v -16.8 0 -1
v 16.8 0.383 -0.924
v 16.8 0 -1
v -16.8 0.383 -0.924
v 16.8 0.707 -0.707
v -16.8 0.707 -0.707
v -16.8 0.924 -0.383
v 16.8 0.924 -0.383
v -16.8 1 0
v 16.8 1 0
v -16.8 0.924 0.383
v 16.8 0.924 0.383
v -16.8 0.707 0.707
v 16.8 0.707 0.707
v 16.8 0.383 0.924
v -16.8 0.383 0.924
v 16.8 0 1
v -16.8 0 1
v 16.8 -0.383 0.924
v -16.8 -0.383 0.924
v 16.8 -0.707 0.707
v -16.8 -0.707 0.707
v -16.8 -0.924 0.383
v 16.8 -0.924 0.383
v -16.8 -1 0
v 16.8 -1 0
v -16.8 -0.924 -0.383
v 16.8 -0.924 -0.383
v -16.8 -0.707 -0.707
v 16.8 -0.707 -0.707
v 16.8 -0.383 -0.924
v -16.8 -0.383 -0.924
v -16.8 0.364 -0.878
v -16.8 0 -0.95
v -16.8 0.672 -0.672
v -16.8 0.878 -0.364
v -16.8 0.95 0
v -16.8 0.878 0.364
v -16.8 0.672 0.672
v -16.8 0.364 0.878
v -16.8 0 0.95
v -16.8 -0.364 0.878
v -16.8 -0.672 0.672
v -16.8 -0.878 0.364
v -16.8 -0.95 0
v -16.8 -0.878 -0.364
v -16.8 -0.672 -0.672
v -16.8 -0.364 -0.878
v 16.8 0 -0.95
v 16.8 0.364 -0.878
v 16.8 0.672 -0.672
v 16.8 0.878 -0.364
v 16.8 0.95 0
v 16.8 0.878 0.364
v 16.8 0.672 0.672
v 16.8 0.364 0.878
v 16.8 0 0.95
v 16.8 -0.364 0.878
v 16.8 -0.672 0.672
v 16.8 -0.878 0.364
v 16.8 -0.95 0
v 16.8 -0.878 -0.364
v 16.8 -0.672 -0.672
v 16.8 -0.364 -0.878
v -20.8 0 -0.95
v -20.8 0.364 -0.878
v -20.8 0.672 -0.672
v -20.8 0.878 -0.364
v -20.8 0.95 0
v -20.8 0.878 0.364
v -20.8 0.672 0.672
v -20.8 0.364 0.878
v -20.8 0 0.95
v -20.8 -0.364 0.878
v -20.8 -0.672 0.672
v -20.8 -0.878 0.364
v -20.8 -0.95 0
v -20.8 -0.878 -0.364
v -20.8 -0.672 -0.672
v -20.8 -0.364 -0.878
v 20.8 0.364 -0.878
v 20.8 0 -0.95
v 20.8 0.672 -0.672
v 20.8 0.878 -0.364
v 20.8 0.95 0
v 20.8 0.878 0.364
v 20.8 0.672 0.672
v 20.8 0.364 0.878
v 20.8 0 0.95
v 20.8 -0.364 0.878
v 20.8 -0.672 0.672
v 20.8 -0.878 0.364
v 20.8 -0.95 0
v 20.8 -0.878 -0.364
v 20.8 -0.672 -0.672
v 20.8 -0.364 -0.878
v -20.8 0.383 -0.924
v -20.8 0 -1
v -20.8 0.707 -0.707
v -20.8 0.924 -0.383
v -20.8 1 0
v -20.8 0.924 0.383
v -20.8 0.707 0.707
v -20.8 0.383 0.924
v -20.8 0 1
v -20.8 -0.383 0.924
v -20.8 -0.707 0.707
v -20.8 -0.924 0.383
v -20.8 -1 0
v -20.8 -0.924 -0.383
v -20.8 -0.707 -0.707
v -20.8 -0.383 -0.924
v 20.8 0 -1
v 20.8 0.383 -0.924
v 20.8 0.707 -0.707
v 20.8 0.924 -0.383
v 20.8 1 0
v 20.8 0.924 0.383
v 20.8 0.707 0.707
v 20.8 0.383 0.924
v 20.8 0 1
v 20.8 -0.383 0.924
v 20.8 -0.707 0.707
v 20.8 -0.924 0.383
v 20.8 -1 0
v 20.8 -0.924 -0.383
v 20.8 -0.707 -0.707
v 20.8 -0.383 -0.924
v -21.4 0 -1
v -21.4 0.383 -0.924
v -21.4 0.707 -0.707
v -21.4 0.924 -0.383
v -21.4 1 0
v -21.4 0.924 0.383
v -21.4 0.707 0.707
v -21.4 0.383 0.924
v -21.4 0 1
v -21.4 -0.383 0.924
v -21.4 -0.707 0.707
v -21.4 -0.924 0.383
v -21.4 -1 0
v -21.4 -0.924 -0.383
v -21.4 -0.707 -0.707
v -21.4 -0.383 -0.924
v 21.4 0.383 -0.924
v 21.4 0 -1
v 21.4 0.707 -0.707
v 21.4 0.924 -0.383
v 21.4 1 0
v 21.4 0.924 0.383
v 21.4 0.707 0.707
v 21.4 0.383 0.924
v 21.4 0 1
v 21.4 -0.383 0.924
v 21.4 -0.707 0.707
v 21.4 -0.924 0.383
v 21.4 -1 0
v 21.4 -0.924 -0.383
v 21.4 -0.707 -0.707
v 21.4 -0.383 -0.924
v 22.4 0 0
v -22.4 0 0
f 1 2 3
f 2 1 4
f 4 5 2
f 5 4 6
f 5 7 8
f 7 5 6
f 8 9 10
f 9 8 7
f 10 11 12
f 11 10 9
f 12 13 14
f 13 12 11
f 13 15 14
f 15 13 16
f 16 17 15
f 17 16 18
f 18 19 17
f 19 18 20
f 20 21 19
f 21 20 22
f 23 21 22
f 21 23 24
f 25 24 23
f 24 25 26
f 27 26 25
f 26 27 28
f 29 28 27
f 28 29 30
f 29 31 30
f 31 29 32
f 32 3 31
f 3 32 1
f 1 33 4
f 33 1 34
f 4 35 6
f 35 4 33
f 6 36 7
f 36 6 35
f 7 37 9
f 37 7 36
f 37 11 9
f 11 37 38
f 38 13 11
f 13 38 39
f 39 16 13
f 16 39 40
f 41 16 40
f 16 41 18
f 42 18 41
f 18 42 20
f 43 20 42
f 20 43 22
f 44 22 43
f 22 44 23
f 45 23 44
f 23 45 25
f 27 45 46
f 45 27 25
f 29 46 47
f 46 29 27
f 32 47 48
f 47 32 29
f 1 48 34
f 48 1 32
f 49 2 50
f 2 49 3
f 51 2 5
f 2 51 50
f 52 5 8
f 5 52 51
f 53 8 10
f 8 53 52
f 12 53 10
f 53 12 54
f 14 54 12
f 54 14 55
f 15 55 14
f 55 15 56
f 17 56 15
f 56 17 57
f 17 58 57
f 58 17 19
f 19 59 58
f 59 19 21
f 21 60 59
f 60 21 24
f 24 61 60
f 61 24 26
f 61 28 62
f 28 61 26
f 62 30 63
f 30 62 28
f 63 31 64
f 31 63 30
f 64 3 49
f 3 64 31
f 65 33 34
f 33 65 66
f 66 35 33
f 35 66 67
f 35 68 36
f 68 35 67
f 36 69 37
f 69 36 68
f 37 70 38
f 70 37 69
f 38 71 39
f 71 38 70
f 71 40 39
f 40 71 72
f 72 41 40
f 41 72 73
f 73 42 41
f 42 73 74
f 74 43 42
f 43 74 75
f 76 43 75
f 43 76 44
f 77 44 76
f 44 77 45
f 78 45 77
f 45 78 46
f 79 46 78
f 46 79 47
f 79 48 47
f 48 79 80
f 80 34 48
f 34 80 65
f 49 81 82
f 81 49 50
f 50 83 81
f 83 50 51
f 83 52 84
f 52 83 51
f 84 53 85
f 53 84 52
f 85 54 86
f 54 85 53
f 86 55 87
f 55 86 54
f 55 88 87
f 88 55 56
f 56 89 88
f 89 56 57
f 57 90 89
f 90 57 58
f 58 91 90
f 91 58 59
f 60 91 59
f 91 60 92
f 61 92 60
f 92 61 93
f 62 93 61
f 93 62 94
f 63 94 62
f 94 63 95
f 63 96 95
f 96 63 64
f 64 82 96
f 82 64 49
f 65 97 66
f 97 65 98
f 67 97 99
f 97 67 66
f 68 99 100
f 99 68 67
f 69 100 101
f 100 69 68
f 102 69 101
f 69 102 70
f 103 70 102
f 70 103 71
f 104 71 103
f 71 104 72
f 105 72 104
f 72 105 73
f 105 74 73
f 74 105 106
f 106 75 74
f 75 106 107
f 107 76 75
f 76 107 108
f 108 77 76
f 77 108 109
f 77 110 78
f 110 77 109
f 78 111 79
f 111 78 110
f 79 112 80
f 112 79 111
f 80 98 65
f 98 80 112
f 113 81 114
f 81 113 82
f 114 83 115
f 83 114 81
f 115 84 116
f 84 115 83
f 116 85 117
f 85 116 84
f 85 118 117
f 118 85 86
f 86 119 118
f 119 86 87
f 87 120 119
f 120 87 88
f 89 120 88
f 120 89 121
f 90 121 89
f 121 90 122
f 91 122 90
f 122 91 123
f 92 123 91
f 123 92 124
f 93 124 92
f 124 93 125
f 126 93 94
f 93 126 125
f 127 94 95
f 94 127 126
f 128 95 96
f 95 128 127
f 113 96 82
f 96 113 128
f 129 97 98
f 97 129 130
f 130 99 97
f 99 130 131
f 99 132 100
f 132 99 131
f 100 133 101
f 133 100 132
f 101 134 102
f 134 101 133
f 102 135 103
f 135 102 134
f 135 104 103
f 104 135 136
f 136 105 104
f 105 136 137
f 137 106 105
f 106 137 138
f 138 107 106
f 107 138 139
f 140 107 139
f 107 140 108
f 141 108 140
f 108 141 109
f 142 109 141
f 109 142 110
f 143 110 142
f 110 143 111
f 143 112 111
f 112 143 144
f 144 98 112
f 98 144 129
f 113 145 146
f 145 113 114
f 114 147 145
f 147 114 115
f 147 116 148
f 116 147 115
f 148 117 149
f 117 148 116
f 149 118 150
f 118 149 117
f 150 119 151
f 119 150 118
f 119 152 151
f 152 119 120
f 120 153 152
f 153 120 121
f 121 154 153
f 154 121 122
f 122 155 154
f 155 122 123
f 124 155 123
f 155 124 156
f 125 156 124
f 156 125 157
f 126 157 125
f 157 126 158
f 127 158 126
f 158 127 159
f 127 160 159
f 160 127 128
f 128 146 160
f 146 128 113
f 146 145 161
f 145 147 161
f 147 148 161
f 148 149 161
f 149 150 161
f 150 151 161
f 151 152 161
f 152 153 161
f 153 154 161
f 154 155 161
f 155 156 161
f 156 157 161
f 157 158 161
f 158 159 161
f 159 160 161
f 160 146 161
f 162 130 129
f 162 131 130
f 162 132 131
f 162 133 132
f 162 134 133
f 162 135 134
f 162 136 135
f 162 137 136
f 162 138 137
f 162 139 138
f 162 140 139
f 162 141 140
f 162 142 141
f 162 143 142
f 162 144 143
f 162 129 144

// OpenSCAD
// file: ../p/4-4edge.scad
use <../lib.scad>
function ldraw_lib__4_4edge() = [
// 0 Circle 1.0
// 0 Name: 4-4edge.dat
// 0 Author: James Jessiman
// 0 !LDRAW_ORG Primitive UPDATE 2017-01
// 0 !LICENSE Licensed under CC BY 2.0 and CC BY 4.0 : see CAreadme.txt
// 
// 0 BFC CERTIFY CCW
  [0,"BFC","CERTIFY"],
  [0,"BFC","CCW"],
// 
// 0 !HISTORY 1998-12-15 [PTadmin] Official Update 1998-10
// 0 !HISTORY 2005-12-28 [PTadmin] Official Update 2005-01
// 0 !HISTORY 2007-06-24 [PTadmin] Header formatted for Contributor Agreement
// 0 !HISTORY 2008-07-01 [PTadmin] Official Update 2008-01
// 0 !HISTORY 2017-01-15 [Steffen] BFCed
// 0 !HISTORY 2017-12-30 [PTadmin] Official Update 2017-01
// 
// 
// 2 24 1 0 0 0.9239 0 0.3827
  [2,24,1,0,0,0.9239,0,0.3827],
// 2 24 0.9239 0 0.3827 0.7071 0 0.7071
  [2,24,0.9239,0,0.3827,0.7071,0,0.7071],
// 2 24 0.7071 0 0.7071 0.3827 0 0.9239
  [2,24,0.7071,0,0.7071,0.3827,0,0.9239],
// 2 24 0.3827 0 0.9239 0 0 1
  [2,24,0.3827,0,0.9239,0,0,1],
// 2 24 0 0 1 -0.3827 0 0.9239
  [2,24,0,0,1,-0.3827,0,0.9239],
// 2 24 -0.3827 0 0.9239 -0.7071 0 0.7071
  [2,24,-0.3827,0,0.9239,-0.7071,0,0.7071],
// 2 24 -0.7071 0 0.7071 -0.9239 0 0.3827
  [2,24,-0.7071,0,0.7071,-0.9239,0,0.3827],
// 2 24 -0.9239 0 0.3827 -1 0 -0
  [2,24,-0.9239,0,0.3827,-1,0,-0],
// 2 24 -1 0 -0 -0.9239 0 -0.3827
  [2,24,-1,0,-0,-0.9239,0,-0.3827],
// 2 24 -0.9239 0 -0.3827 -0.7071 0 -0.7071
  [2,24,-0.9239,0,-0.3827,-0.7071,0,-0.7071],
// 2 24 -0.7071 0 -0.7071 -0.3827 0 -0.9239
  [2,24,-0.7071,0,-0.7071,-0.3827,0,-0.9239],
// 2 24 -0.3827 0 -0.9239 0 0 -1
  [2,24,-0.3827,0,-0.9239,0,0,-1],
// 2 24 0 0 -1 0.3827 0 -0.9239
  [2,24,0,0,-1,0.3827,0,-0.9239],
// 2 24 0.3827 0 -0.9239 0.7071 0 -0.7071
  [2,24,0.3827,0,-0.9239,0.7071,0,-0.7071],
// 2 24 0.7071 0 -0.7071 0.9239 0 -0.3827
  [2,24,0.7071,0,-0.7071,0.9239,0,-0.3827],
// 2 24 0.9239 0 -0.3827 1 0 0
  [2,24,0.9239,0,-0.3827,1,0,0],
];
module ldraw_lib__4_4edge(step=0, col=false, unit=2/5, alt=false, line=0.2, solid=!$preview)
    makepoly(ldraw_lib__4_4edge(), step=step, col=col, unit=unit, alt=alt, line=line, solid=solid);
ldraw_lib__4_4edge(line=0.2);
// file: ../p/4-4cyli.scad
use <../lib.scad>
function ldraw_lib__4_4cyli() = [
// 0 Cylinder 1.0
// 0 Name: 4-4cyli.dat
// 0 Author: James Jessiman
// 0 !LDRAW_ORG Primitive UPDATE 2005-01
// 0 !LICENSE Licensed under CC BY 2.0 and CC BY 4.0 : see CAreadme.txt
// 
// 0 BFC CERTIFY CCW
  [0,"BFC","CERTIFY"],
  [0,"BFC","CCW"],
// 
// 0 !HISTORY 1998-12-15 [PTadmin] Official Update 1998-10
// 0 !HISTORY 2002-03-23 [sbliss] Added BFC statement; merged headers from files in distributions LDraw 0.27 and Complete.
// 0 !HISTORY 2002-04-25 [PTadmin] Official Update 2002-02
// 0 !HISTORY 2004-12-14 [guyvivan] BFC CCW
// 0 !HISTORY 2005-12-28 [PTadmin] Official Update 2005-01
// 0 !HISTORY 2007-06-24 [PTadmin] Header formatted for Contributor Agreement
// 0 !HISTORY 2008-07-01 [PTadmin] Official Update 2008-01
// 
// 
// 4 16 1 1 0 0.9239 1 0.3827 0.9239 0 0.3827 1 0 0
  [4,16,1,1,0,0.9239,1,0.3827,0.9239,0,0.3827,1,0,0],
// 5 24 1 0 0 1 1 0 0.9239 0 0.3827 0.9239 0 -0.3827
  [5,24,1,0,0,1,1,0,0.9239,0,0.3827,0.9239,0,-0.3827],
// 4 16 0.9239 1 0.3827 0.7071 1 0.7071 0.7071 0 0.7071 0.9239 0 0.3827
  [4,16,0.9239,1,0.3827,0.7071,1,0.7071,0.7071,0,0.7071,0.9239,0,0.3827],
// 5 24 0.9239 0 0.3827 0.9239 1 0.3827 0.7071 0 0.7071 1 0 0
  [5,24,0.9239,0,0.3827,0.9239,1,0.3827,0.7071,0,0.7071,1,0,0],
// 4 16 0.7071 1 0.7071 0.3827 1 0.9239 0.3827 0 0.9239 0.7071 0 0.7071
  [4,16,0.7071,1,0.7071,0.3827,1,0.9239,0.3827,0,0.9239,0.7071,0,0.7071],
// 5 24 0.7071 0 0.7071 0.7071 1 0.7071 0.3827 0 0.9239 0.9239 0 0.3827
  [5,24,0.7071,0,0.7071,0.7071,1,0.7071,0.3827,0,0.9239,0.9239,0,0.3827],
// 4 16 0.3827 1 0.9239 0 1 1 0 0 1 0.3827 0 0.9239
  [4,16,0.3827,1,0.9239,0,1,1,0,0,1,0.3827,0,0.9239],
// 5 24 0.3827 0 0.9239 0.3827 1 0.9239 0 0 1 0.7071 0 0.7071
  [5,24,0.3827,0,0.9239,0.3827,1,0.9239,0,0,1,0.7071,0,0.7071],
// 4 16 0 1 1 -0.3827 1 0.9239 -0.3827 0 0.9239 0 0 1
  [4,16,0,1,1,-0.3827,1,0.9239,-0.3827,0,0.9239,0,0,1],
// 5 24 0 0 1 0 1 1 -0.3827 0 0.9239 0.3827 0 0.9239
  [5,24,0,0,1,0,1,1,-0.3827,0,0.9239,0.3827,0,0.9239],
// 4 16 -0.3827 1 0.9239 -0.7071 1 0.7071 -0.7071 0 0.7071 -0.3827 0 0.9239
  [4,16,-0.3827,1,0.9239,-0.7071,1,0.7071,-0.7071,0,0.7071,-0.3827,0,0.9239],
// 5 24 -0.3827 0 0.9239 -0.3827 1 0.9239 -0.7071 0 0.7071 0 0 1
  [5,24,-0.3827,0,0.9239,-0.3827,1,0.9239,-0.7071,0,0.7071,0,0,1],
// 4 16 -0.7071 1 0.7071 -0.9239 1 0.3827 -0.9239 0 0.3827 -0.7071 0 0.7071
  [4,16,-0.7071,1,0.7071,-0.9239,1,0.3827,-0.9239,0,0.3827,-0.7071,0,0.7071],
// 5 24 -0.7071 0 0.7071 -0.7071 1 0.7071 -0.9239 0 0.3827 -0.3827 0 0.9239
  [5,24,-0.7071,0,0.7071,-0.7071,1,0.7071,-0.9239,0,0.3827,-0.3827,0,0.9239],
// 4 16 -0.9239 1 0.3827 -1 1 0 -1 0 0 -0.9239 0 0.3827
  [4,16,-0.9239,1,0.3827,-1,1,0,-1,0,0,-0.9239,0,0.3827],
// 5 24 -0.9239 0 0.3827 -0.9239 1 0.3827 -1 0 0 -0.7071 0 0.7071
  [5,24,-0.9239,0,0.3827,-0.9239,1,0.3827,-1,0,0,-0.7071,0,0.7071],
// 4 16 -1 1 0 -0.9239 1 -0.3827 -0.9239 0 -0.3827 -1 0 0
  [4,16,-1,1,0,-0.9239,1,-0.3827,-0.9239,0,-0.3827,-1,0,0],
// 5 24 -1 0 0 -1 1 0 -0.9239 0 -0.3827 -0.9239 0 0.3827
  [5,24,-1,0,0,-1,1,0,-0.9239,0,-0.3827,-0.9239,0,0.3827],
// 4 16 -0.9239 1 -0.3827 -0.7071 1 -0.7071 -0.7071 0 -0.7071 -0.9239 0 -0.3827
  [4,16,-0.9239,1,-0.3827,-0.7071,1,-0.7071,-0.7071,0,-0.7071,-0.9239,0,-0.3827],
// 5 24 -0.9239 0 -0.3827 -0.9239 1 -0.3827 -0.7071 0 -0.7071 -1 0 0
  [5,24,-0.9239,0,-0.3827,-0.9239,1,-0.3827,-0.7071,0,-0.7071,-1,0,0],
// 4 16 -0.7071 1 -0.7071 -0.3827 1 -0.9239 -0.3827 0 -0.9239 -0.7071 0 -0.7071
  [4,16,-0.7071,1,-0.7071,-0.3827,1,-0.9239,-0.3827,0,-0.9239,-0.7071,0,-0.7071],
// 5 24 -0.7071 0 -0.7071 -0.7071 1 -0.7071 -0.3827 0 -0.9239 -0.9239 0 -0.3827
  [5,24,-0.7071,0,-0.7071,-0.7071,1,-0.7071,-0.3827,0,-0.9239,-0.9239,0,-0.3827],
// 4 16 -0.3827 1 -0.9239 0 1 -1 0 0 -1 -0.3827 0 -0.9239
  [4,16,-0.3827,1,-0.9239,0,1,-1,0,0,-1,-0.3827,0,-0.9239],
// 5 24 -0.3827 0 -0.9239 -0.3827 1 -0.9239 0 0 -1 -0.7071 0 -0.7071
  [5,24,-0.3827,0,-0.9239,-0.3827,1,-0.9239,0,0,-1,-0.7071,0,-0.7071],
// 4 16 0 1 -1 0.3827 1 -0.9239 0.3827 0 -0.9239 0 0 -1
  [4,16,0,1,-1,0.3827,1,-0.9239,0.3827,0,-0.9239,0,0,-1],
// 5 24 0 0 -1 0 1 -1 0.3827 0 -0.9239 -0.3827 0 -0.9239
  [5,24,0,0,-1,0,1,-1,0.3827,0,-0.9239,-0.3827,0,-0.9239],
// 4 16 0.3827 1 -0.9239 0.7071 1 -0.7071 0.7071 0 -0.7071 0.3827 0 -0.9239
  [4,16,0.3827,1,-0.9239,0.7071,1,-0.7071,0.7071,0,-0.7071,0.3827,0,-0.9239],
// 5 24 0.3827 0 -0.9239 0.3827 1 -0.9239 0.7071 0 -0.7071 0 0 -1
  [5,24,0.3827,0,-0.9239,0.3827,1,-0.9239,0.7071,0,-0.7071,0,0,-1],
// 4 16 0.7071 1 -0.7071 0.9239 1 -0.3827 0.9239 0 -0.3827 0.7071 0 -0.7071
  [4,16,0.7071,1,-0.7071,0.9239,1,-0.3827,0.9239,0,-0.3827,0.7071,0,-0.7071],
// 5 24 0.7071 0 -0.7071 0.7071 1 -0.7071 0.9239 0 -0.3827 0.3827 0 -0.9239
  [5,24,0.7071,0,-0.7071,0.7071,1,-0.7071,0.9239,0,-0.3827,0.3827,0,-0.9239],
// 4 16 0.9239 1 -0.3827 1 1 0 1 0 0 0.9239 0 -0.3827
  [4,16,0.9239,1,-0.3827,1,1,0,1,0,0,0.9239,0,-0.3827],
// 5 24 0.9239 0 -0.3827 0.9239 1 -0.3827 1 0 0 0.7071 0 -0.7071
  [5,24,0.9239,0,-0.3827,0.9239,1,-0.3827,1,0,0,0.7071,0,-0.7071],
// 0
];
module ldraw_lib__4_4cyli(step=0, col=false, unit=2/5, alt=false, line=0.2, solid=!$preview)
    makepoly(ldraw_lib__4_4cyli(), step=step, col=col, unit=unit, alt=alt, line=line, solid=solid);
ldraw_lib__4_4cyli(line=0.2);
// file: ../p/4-4rin19.scad
use <../lib.scad>
function ldraw_lib__4_4rin19() = [
// 0 Ring 19 x 1.0
// 0 Name: 4-4rin19.dat
// 0 Author: Guy Vivan [guyvivan]
// 0 !LDRAW_ORG Primitive UPDATE 2010-01
// 0 !LICENSE Licensed under CC BY 2.0 and CC BY 4.0 : see CAreadme.txt
// 
// 0 BFC CERTIFY CCW
  [0,"BFC","CERTIFY"],
  [0,"BFC","CCW"],
// 
// 0 !HISTORY 2010-04-05 [PTadmin] Official Update 2010-01
// 
// 
// 4 16 19 0 0 20 0 0 18.478 0 7.654 17.5541 0 7.2713
  [4,16,19,0,0,20,0,0,18.478,0,7.654,17.5541,0,7.2713],
// 4 16 17.5541 0 7.2713 18.478 0 7.654 14.142 0 14.142 13.4349 0 13.4349
  [4,16,17.5541,0,7.2713,18.478,0,7.654,14.142,0,14.142,13.4349,0,13.4349],
// 4 16 13.4349 0 13.4349 14.142 0 14.142 7.654 0 18.478 7.2713 0 17.5541
  [4,16,13.4349,0,13.4349,14.142,0,14.142,7.654,0,18.478,7.2713,0,17.5541],
// 4 16 7.2713 0 17.5541 7.654 0 18.478 0 0 20 0 0 19
  [4,16,7.2713,0,17.5541,7.654,0,18.478,0,0,20,0,0,19],
// 4 16 0 0 19 0 0 20 -7.654 0 18.478 -7.2713 0 17.5541
  [4,16,0,0,19,0,0,20,-7.654,0,18.478,-7.2713,0,17.5541],
// 4 16 -7.2713 0 17.5541 -7.654 0 18.478 -14.142 0 14.142 -13.4349 0 13.4349
  [4,16,-7.2713,0,17.5541,-7.654,0,18.478,-14.142,0,14.142,-13.4349,0,13.4349],
// 4 16 -13.4349 0 13.4349 -14.142 0 14.142 -18.478 0 7.654 -17.5541 0 7.2713
  [4,16,-13.4349,0,13.4349,-14.142,0,14.142,-18.478,0,7.654,-17.5541,0,7.2713],
// 4 16 -17.5541 0 7.2713 -18.478 0 7.654 -20 0 0 -19 0 0
  [4,16,-17.5541,0,7.2713,-18.478,0,7.654,-20,0,0,-19,0,0],
// 4 16 -19 0 0 -20 0 0 -18.478 0 -7.654 -17.5541 0 -7.2713
  [4,16,-19,0,0,-20,0,0,-18.478,0,-7.654,-17.5541,0,-7.2713],
// 4 16 -17.5541 0 -7.2713 -18.478 0 -7.654 -14.142 0 -14.142 -13.4349 0 -13.4349
  [4,16,-17.5541,0,-7.2713,-18.478,0,-7.654,-14.142,0,-14.142,-13.4349,0,-13.4349],
// 4 16 -13.4349 0 -13.4349 -14.142 0 -14.142 -7.654 0 -18.478 -7.2713 0 -17.5541
  [4,16,-13.4349,0,-13.4349,-14.142,0,-14.142,-7.654,0,-18.478,-7.2713,0,-17.5541],
// 4 16 -7.2713 0 -17.5541 -7.654 0 -18.478 0 0 -20 0 0 -19
  [4,16,-7.2713,0,-17.5541,-7.654,0,-18.478,0,0,-20,0,0,-19],
// 4 16 0 0 -19 0 0 -20 7.654 0 -18.478 7.2713 0 -17.5541
  [4,16,0,0,-19,0,0,-20,7.654,0,-18.478,7.2713,0,-17.5541],
// 4 16 7.2713 0 -17.5541 7.654 0 -18.478 14.142 0 -14.142 13.4349 0 -13.4349
  [4,16,7.2713,0,-17.5541,7.654,0,-18.478,14.142,0,-14.142,13.4349,0,-13.4349],
// 4 16 13.4349 0 -13.4349 14.142 0 -14.142 18.478 0 -7.654 17.5541 0 -7.2713
  [4,16,13.4349,0,-13.4349,14.142,0,-14.142,18.478,0,-7.654,17.5541,0,-7.2713],
// 4 16 17.5541 0 -7.2713 18.478 0 -7.654 20 0 0 19 0 0
  [4,16,17.5541,0,-7.2713,18.478,0,-7.654,20,0,0,19,0,0],
// 
// 0 end of file
// 
];
module ldraw_lib__4_4rin19(step=0, col=false, unit=2/5, alt=false, line=0.2, solid=!$preview)
    makepoly(ldraw_lib__4_4rin19(), step=step, col=col, unit=unit, alt=alt, line=line, solid=solid);
ldraw_lib__4_4rin19(line=0.2);
// file: ../p/4-4cylo.scad
use <../lib.scad>
use <4-4cyli.scad>
use <4-4edge.scad>
function ldraw_lib__4_4cylo() = [
// 0 Cylinder Open 1.0
// 0 Name: 4-4cylo.dat
// 0 Author: Mark Kennedy [mkennedy]
// 0 !LDRAW_ORG Primitive UPDATE 2010-01
// 0 !LICENSE Licensed under CC BY 2.0 and CC BY 4.0 : see CAreadme.txt
// 
// 0 BFC CERTIFY CCW
  [0,"BFC","CERTIFY"],
  [0,"BFC","CCW"],
// 
// 0 !HISTORY 2010-04-05 [PTadmin] Official Update 2010-01
// 
// 
// 1 16 0 0 0 1 0 0 0 1 0 0 0 1 4-4edge.dat
  [1,16,0,0,0,1,0,0,0,1,0,0,0,1, ldraw_lib__4_4edge()],
// 1 16 0 1 0 1 0 0 0 1 0 0 0 1 4-4edge.dat
  [1,16,0,1,0,1,0,0,0,1,0,0,0,1, ldraw_lib__4_4edge()],
// 1 16 0 0 0 1 0 0 0 1 0 0 0 1 4-4cyli.dat
  [1,16,0,0,0,1,0,0,0,1,0,0,0,1, ldraw_lib__4_4cyli()],
// 0
];
module ldraw_lib__4_4cylo(step=0, col=false, unit=2/5, alt=false, line=0.2, solid=!$preview)
    makepoly(ldraw_lib__4_4cylo(), step=step, col=col, unit=unit, alt=alt, line=line, solid=solid);
ldraw_lib__4_4cylo(line=0.2);
// file: ../p/4-4con0.scad
use <../lib.scad>
function ldraw_lib__4_4con0() = [
// 0 Cone  0 x 1.0
// 0 Name: 4-4con0.dat
// 0 Author: William Howard [WilliamH]
// 0 !LDRAW_ORG Primitive UPDATE 2009-03
// 0 !LICENSE Licensed under CC BY 2.0 and CC BY 4.0 : see CAreadme.txt
// 
// 0 BFC CERTIFY CCW
  [0,"BFC","CERTIFY"],
  [0,"BFC","CCW"],
// 
// 0 !HISTORY 2009-12-29 [PTadmin] Official Update 2009-03
// 
// 
// 3 16 0 1 0 0.9239 0 0.3827 1 0 0
  [3,16,0,1,0,0.9239,0,0.3827,1,0,0],
// 3 16 0 1 0 0.7071 0 0.7071 0.9239 0 0.3827
  [3,16,0,1,0,0.7071,0,0.7071,0.9239,0,0.3827],
// 3 16 0 1 0 0.3827 0 0.9239 0.7071 0 0.7071
  [3,16,0,1,0,0.3827,0,0.9239,0.7071,0,0.7071],
// 3 16 0 1 0 0 0 1 0.3827 0 0.9239
  [3,16,0,1,0,0,0,1,0.3827,0,0.9239],
// 3 16 0 1 0 -0.3827 0 0.9239 0 0 1
  [3,16,0,1,0,-0.3827,0,0.9239,0,0,1],
// 3 16 0 1 0 -0.7071 0 0.7071 -0.3827 0 0.9239
  [3,16,0,1,0,-0.7071,0,0.7071,-0.3827,0,0.9239],
// 3 16 0 1 0 -0.9239 0 0.3827 -0.7071 0 0.7071
  [3,16,0,1,0,-0.9239,0,0.3827,-0.7071,0,0.7071],
// 3 16 0 1 0 -1 0 0 -0.9239 0 0.3827
  [3,16,0,1,0,-1,0,0,-0.9239,0,0.3827],
// 3 16 0 1 0 -0.9239 0 -0.3827 -1 0 0
  [3,16,0,1,0,-0.9239,0,-0.3827,-1,0,0],
// 3 16 0 1 0 -0.7071 0 -0.7071 -0.9239 0 -0.3827
  [3,16,0,1,0,-0.7071,0,-0.7071,-0.9239,0,-0.3827],
// 3 16 0 1 0 -0.3827 0 -0.9239 -0.7071 0 -0.7071
  [3,16,0,1,0,-0.3827,0,-0.9239,-0.7071,0,-0.7071],
// 3 16 0 1 0 0 0 -1 -0.3827 0 -0.9239
  [3,16,0,1,0,0,0,-1,-0.3827,0,-0.9239],
// 3 16 0 1 0 0.3827 0 -0.9239 0 0 -1
  [3,16,0,1,0,0.3827,0,-0.9239,0,0,-1],
// 3 16 0 1 0 0.7071 0 -0.7071 0.3827 0 -0.9239
  [3,16,0,1,0,0.7071,0,-0.7071,0.3827,0,-0.9239],
// 3 16 0 1 0 0.9239 0 -0.3827 0.7071 0 -0.7071
  [3,16,0,1,0,0.9239,0,-0.3827,0.7071,0,-0.7071],
// 3 16 0 1 0 1 0 0 0.9239 0 -0.3827
  [3,16,0,1,0,1,0,0,0.9239,0,-0.3827],
// 
// 0 conditional lines
// 5 24 0 1 0 1 0 0 0.9239 0 -0.3827 0.9239 0 0.3827
  [5,24,0,1,0,1,0,0,0.9239,0,-0.3827,0.9239,0,0.3827],
// 5 24 0 1 0 0.9239 0 0.3827 1 0 0 0.7071 0 0.7071
  [5,24,0,1,0,0.9239,0,0.3827,1,0,0,0.7071,0,0.7071],
// 5 24 0 1 0 0.7071 0 0.7071 0.9239 0 0.3827 0.3827 0 0.9239
  [5,24,0,1,0,0.7071,0,0.7071,0.9239,0,0.3827,0.3827,0,0.9239],
// 5 24 0 1 0 0.3827 0 0.9239 0.7071 0 0.7071 0 0 1
  [5,24,0,1,0,0.3827,0,0.9239,0.7071,0,0.7071,0,0,1],
// 5 24 0 1 0 0 0 1 0.3827 0 0.9239 -0.3827 0 0.9239
  [5,24,0,1,0,0,0,1,0.3827,0,0.9239,-0.3827,0,0.9239],
// 5 24 0 1 0 -0.3827 0 0.9239 0 0 1 -0.7071 0 0.7071
  [5,24,0,1,0,-0.3827,0,0.9239,0,0,1,-0.7071,0,0.7071],
// 5 24 0 1 0 -0.7071 0 0.7071 -0.3827 0 0.9239 -0.9239 0 0.3827
  [5,24,0,1,0,-0.7071,0,0.7071,-0.3827,0,0.9239,-0.9239,0,0.3827],
// 5 24 0 1 0 -0.9239 0 0.3827 -0.7071 0 0.7071 -1 0 0
  [5,24,0,1,0,-0.9239,0,0.3827,-0.7071,0,0.7071,-1,0,0],
// 5 24 0 1 0 -1 0 0 -0.9239 0 0.3827 -0.9239 0 -0.3827
  [5,24,0,1,0,-1,0,0,-0.9239,0,0.3827,-0.9239,0,-0.3827],
// 5 24 0 1 0 -0.9239 0 -0.3827 -1 0 0 -0.7071 0 -0.7071
  [5,24,0,1,0,-0.9239,0,-0.3827,-1,0,0,-0.7071,0,-0.7071],
// 5 24 0 1 0 -0.7071 0 -0.7071 -0.9239 0 -0.3827 -0.3827 0 -0.9239
  [5,24,0,1,0,-0.7071,0,-0.7071,-0.9239,0,-0.3827,-0.3827,0,-0.9239],
// 5 24 0 1 0 -0.3827 0 -0.9239 -0.7071 0 -0.7071 0 0 -1
  [5,24,0,1,0,-0.3827,0,-0.9239,-0.7071,0,-0.7071,0,0,-1],
// 5 24 0 1 0 0 0 -1 -0.3827 0 -0.9239 0.3827 0 -0.9239
  [5,24,0,1,0,0,0,-1,-0.3827,0,-0.9239,0.3827,0,-0.9239],
// 5 24 0 1 0 0.3827 0 -0.9239 0 0 -1 0.7071 0 -0.7071
  [5,24,0,1,0,0.3827,0,-0.9239,0,0,-1,0.7071,0,-0.7071],
// 5 24 0 1 0 0.7071 0 -0.7071 0.3827 0 -0.9239 0.9239 0 -0.3827
  [5,24,0,1,0,0.7071,0,-0.7071,0.3827,0,-0.9239,0.9239,0,-0.3827],
// 5 24 0 1 0 0.9239 0 -0.3827 0.7071 0 -0.7071 1 0 0
  [5,24,0,1,0,0.9239,0,-0.3827,0.7071,0,-0.7071,1,0,0],
// 
// 0 end of file
];
module ldraw_lib__4_4con0(step=0, col=false, unit=2/5, alt=false, line=0.2, solid=!$preview)
    makepoly(ldraw_lib__4_4con0(), step=step, col=col, unit=unit, alt=alt, line=line, solid=solid);
ldraw_lib__4_4con0(line=0.2);
// main file
use <../lib.scad>
use <../p/4-4con0.scad>
use <../p/4-4cylo.scad>
use <../p/4-4rin19.scad>
function ldraw_lib__70720() = [
// 0 ~Axle Steel  5 x 112 LDU with Conical Ends
// 0 Name: 70720.dat
// 0 Author: Magnus Forsberg [MagFors]
// 0 !LDRAW_ORG Part UPDATE 2013-02
// 0 !LICENSE Licensed under CC BY 2.0 and CC BY 4.0 : see CAreadme.txt
// 
// 0 BFC CERTIFY CCW
  [0,"BFC","CERTIFY"],
  [0,"BFC","CCW"],
// 
// 0 !CATEGORY Wheel
// 
// 0 !HISTORY 2013-06-28 [MMR1988] Changed to correct dimensions.
// 0 !HISTORY 2013-12-23 [PTadmin] Official Update 2013-02
// 
// 
// 1 16 -42 0 0 0 84 0 2.5 0 0 0 0 2.5 4-4cylo.dat
  [1,16,-42,0,0,0,84,0,2.5,0,0,0,0,2.5, ldraw_lib__4_4cylo()],
// 1 16 -42 0 0 0 1 0 0.125 0 0 0 0 0.125 4-4rin19.dat
  [1,16,-42,0,0,0,1,0,0.125,0,0,0,0,0.125, ldraw_lib__4_4rin19()],
// 1 16 42 0 0 0 -1 0 0.125 0 0 0 0 0.125 4-4rin19.dat
  [1,16,42,0,0,0,-1,0,0.125,0,0,0,0,0.125, ldraw_lib__4_4rin19()],
// 1 16 -42 0 0 0 -10 0 2.375 0 0 0 0 2.375 4-4cylo.dat
  [1,16,-42,0,0,0,-10,0,2.375,0,0,0,0,2.375, ldraw_lib__4_4cylo()],
// 1 16 42 0 0 0 10 0 2.375 0 0 0 0 2.375 4-4cylo.dat
  [1,16,42,0,0,0,10,0,2.375,0,0,0,0,2.375, ldraw_lib__4_4cylo()],
// 
// 1 16 -52 0 0 0 -1 0 0.125 0 0 0 0 0.125 4-4rin19.dat
  [1,16,-52,0,0,0,-1,0,0.125,0,0,0,0,0.125, ldraw_lib__4_4rin19()],
// 1 16 52 0 0 0 1 0 0.125 0 0 0 0 0.125 4-4rin19.dat
  [1,16,52,0,0,0,1,0,0.125,0,0,0,0,0.125, ldraw_lib__4_4rin19()],
// 1 16 -53.5 0 0 0 1.5 0 2.5 0 0 0 0 2.5 4-4cylo.dat
  [1,16,-53.5,0,0,0,1.5,0,2.5,0,0,0,0,2.5, ldraw_lib__4_4cylo()],
// 1 16 53.5 0 0 0 -1.5 0 2.5 0 0 0 0 2.5 4-4cylo.dat
  [1,16,53.5,0,0,0,-1.5,0,2.5,0,0,0,0,2.5, ldraw_lib__4_4cylo()],
// 
// 1 16 53.5 0 0 0 2.5 0 2.5 0 0 0 0 2.5 4-4con0.dat
  [1,16,53.5,0,0,0,2.5,0,2.5,0,0,0,0,2.5, ldraw_lib__4_4con0()],
// 1 16 -53.5 0 0 0 -2.5 0 2.5 0 0 0 0 2.5 4-4con0.dat
  [1,16,-53.5,0,0,0,-2.5,0,2.5,0,0,0,0,2.5, ldraw_lib__4_4con0()],
];
module ldraw_lib__70720(step=0, col=false, unit=2/5, alt=false, line=0.2, solid=!$preview)
    makepoly(ldraw_lib__70720(), step=step, col=col, unit=unit, alt=alt, line=line, solid=solid);
ldraw_lib__70720(line=0.2);
